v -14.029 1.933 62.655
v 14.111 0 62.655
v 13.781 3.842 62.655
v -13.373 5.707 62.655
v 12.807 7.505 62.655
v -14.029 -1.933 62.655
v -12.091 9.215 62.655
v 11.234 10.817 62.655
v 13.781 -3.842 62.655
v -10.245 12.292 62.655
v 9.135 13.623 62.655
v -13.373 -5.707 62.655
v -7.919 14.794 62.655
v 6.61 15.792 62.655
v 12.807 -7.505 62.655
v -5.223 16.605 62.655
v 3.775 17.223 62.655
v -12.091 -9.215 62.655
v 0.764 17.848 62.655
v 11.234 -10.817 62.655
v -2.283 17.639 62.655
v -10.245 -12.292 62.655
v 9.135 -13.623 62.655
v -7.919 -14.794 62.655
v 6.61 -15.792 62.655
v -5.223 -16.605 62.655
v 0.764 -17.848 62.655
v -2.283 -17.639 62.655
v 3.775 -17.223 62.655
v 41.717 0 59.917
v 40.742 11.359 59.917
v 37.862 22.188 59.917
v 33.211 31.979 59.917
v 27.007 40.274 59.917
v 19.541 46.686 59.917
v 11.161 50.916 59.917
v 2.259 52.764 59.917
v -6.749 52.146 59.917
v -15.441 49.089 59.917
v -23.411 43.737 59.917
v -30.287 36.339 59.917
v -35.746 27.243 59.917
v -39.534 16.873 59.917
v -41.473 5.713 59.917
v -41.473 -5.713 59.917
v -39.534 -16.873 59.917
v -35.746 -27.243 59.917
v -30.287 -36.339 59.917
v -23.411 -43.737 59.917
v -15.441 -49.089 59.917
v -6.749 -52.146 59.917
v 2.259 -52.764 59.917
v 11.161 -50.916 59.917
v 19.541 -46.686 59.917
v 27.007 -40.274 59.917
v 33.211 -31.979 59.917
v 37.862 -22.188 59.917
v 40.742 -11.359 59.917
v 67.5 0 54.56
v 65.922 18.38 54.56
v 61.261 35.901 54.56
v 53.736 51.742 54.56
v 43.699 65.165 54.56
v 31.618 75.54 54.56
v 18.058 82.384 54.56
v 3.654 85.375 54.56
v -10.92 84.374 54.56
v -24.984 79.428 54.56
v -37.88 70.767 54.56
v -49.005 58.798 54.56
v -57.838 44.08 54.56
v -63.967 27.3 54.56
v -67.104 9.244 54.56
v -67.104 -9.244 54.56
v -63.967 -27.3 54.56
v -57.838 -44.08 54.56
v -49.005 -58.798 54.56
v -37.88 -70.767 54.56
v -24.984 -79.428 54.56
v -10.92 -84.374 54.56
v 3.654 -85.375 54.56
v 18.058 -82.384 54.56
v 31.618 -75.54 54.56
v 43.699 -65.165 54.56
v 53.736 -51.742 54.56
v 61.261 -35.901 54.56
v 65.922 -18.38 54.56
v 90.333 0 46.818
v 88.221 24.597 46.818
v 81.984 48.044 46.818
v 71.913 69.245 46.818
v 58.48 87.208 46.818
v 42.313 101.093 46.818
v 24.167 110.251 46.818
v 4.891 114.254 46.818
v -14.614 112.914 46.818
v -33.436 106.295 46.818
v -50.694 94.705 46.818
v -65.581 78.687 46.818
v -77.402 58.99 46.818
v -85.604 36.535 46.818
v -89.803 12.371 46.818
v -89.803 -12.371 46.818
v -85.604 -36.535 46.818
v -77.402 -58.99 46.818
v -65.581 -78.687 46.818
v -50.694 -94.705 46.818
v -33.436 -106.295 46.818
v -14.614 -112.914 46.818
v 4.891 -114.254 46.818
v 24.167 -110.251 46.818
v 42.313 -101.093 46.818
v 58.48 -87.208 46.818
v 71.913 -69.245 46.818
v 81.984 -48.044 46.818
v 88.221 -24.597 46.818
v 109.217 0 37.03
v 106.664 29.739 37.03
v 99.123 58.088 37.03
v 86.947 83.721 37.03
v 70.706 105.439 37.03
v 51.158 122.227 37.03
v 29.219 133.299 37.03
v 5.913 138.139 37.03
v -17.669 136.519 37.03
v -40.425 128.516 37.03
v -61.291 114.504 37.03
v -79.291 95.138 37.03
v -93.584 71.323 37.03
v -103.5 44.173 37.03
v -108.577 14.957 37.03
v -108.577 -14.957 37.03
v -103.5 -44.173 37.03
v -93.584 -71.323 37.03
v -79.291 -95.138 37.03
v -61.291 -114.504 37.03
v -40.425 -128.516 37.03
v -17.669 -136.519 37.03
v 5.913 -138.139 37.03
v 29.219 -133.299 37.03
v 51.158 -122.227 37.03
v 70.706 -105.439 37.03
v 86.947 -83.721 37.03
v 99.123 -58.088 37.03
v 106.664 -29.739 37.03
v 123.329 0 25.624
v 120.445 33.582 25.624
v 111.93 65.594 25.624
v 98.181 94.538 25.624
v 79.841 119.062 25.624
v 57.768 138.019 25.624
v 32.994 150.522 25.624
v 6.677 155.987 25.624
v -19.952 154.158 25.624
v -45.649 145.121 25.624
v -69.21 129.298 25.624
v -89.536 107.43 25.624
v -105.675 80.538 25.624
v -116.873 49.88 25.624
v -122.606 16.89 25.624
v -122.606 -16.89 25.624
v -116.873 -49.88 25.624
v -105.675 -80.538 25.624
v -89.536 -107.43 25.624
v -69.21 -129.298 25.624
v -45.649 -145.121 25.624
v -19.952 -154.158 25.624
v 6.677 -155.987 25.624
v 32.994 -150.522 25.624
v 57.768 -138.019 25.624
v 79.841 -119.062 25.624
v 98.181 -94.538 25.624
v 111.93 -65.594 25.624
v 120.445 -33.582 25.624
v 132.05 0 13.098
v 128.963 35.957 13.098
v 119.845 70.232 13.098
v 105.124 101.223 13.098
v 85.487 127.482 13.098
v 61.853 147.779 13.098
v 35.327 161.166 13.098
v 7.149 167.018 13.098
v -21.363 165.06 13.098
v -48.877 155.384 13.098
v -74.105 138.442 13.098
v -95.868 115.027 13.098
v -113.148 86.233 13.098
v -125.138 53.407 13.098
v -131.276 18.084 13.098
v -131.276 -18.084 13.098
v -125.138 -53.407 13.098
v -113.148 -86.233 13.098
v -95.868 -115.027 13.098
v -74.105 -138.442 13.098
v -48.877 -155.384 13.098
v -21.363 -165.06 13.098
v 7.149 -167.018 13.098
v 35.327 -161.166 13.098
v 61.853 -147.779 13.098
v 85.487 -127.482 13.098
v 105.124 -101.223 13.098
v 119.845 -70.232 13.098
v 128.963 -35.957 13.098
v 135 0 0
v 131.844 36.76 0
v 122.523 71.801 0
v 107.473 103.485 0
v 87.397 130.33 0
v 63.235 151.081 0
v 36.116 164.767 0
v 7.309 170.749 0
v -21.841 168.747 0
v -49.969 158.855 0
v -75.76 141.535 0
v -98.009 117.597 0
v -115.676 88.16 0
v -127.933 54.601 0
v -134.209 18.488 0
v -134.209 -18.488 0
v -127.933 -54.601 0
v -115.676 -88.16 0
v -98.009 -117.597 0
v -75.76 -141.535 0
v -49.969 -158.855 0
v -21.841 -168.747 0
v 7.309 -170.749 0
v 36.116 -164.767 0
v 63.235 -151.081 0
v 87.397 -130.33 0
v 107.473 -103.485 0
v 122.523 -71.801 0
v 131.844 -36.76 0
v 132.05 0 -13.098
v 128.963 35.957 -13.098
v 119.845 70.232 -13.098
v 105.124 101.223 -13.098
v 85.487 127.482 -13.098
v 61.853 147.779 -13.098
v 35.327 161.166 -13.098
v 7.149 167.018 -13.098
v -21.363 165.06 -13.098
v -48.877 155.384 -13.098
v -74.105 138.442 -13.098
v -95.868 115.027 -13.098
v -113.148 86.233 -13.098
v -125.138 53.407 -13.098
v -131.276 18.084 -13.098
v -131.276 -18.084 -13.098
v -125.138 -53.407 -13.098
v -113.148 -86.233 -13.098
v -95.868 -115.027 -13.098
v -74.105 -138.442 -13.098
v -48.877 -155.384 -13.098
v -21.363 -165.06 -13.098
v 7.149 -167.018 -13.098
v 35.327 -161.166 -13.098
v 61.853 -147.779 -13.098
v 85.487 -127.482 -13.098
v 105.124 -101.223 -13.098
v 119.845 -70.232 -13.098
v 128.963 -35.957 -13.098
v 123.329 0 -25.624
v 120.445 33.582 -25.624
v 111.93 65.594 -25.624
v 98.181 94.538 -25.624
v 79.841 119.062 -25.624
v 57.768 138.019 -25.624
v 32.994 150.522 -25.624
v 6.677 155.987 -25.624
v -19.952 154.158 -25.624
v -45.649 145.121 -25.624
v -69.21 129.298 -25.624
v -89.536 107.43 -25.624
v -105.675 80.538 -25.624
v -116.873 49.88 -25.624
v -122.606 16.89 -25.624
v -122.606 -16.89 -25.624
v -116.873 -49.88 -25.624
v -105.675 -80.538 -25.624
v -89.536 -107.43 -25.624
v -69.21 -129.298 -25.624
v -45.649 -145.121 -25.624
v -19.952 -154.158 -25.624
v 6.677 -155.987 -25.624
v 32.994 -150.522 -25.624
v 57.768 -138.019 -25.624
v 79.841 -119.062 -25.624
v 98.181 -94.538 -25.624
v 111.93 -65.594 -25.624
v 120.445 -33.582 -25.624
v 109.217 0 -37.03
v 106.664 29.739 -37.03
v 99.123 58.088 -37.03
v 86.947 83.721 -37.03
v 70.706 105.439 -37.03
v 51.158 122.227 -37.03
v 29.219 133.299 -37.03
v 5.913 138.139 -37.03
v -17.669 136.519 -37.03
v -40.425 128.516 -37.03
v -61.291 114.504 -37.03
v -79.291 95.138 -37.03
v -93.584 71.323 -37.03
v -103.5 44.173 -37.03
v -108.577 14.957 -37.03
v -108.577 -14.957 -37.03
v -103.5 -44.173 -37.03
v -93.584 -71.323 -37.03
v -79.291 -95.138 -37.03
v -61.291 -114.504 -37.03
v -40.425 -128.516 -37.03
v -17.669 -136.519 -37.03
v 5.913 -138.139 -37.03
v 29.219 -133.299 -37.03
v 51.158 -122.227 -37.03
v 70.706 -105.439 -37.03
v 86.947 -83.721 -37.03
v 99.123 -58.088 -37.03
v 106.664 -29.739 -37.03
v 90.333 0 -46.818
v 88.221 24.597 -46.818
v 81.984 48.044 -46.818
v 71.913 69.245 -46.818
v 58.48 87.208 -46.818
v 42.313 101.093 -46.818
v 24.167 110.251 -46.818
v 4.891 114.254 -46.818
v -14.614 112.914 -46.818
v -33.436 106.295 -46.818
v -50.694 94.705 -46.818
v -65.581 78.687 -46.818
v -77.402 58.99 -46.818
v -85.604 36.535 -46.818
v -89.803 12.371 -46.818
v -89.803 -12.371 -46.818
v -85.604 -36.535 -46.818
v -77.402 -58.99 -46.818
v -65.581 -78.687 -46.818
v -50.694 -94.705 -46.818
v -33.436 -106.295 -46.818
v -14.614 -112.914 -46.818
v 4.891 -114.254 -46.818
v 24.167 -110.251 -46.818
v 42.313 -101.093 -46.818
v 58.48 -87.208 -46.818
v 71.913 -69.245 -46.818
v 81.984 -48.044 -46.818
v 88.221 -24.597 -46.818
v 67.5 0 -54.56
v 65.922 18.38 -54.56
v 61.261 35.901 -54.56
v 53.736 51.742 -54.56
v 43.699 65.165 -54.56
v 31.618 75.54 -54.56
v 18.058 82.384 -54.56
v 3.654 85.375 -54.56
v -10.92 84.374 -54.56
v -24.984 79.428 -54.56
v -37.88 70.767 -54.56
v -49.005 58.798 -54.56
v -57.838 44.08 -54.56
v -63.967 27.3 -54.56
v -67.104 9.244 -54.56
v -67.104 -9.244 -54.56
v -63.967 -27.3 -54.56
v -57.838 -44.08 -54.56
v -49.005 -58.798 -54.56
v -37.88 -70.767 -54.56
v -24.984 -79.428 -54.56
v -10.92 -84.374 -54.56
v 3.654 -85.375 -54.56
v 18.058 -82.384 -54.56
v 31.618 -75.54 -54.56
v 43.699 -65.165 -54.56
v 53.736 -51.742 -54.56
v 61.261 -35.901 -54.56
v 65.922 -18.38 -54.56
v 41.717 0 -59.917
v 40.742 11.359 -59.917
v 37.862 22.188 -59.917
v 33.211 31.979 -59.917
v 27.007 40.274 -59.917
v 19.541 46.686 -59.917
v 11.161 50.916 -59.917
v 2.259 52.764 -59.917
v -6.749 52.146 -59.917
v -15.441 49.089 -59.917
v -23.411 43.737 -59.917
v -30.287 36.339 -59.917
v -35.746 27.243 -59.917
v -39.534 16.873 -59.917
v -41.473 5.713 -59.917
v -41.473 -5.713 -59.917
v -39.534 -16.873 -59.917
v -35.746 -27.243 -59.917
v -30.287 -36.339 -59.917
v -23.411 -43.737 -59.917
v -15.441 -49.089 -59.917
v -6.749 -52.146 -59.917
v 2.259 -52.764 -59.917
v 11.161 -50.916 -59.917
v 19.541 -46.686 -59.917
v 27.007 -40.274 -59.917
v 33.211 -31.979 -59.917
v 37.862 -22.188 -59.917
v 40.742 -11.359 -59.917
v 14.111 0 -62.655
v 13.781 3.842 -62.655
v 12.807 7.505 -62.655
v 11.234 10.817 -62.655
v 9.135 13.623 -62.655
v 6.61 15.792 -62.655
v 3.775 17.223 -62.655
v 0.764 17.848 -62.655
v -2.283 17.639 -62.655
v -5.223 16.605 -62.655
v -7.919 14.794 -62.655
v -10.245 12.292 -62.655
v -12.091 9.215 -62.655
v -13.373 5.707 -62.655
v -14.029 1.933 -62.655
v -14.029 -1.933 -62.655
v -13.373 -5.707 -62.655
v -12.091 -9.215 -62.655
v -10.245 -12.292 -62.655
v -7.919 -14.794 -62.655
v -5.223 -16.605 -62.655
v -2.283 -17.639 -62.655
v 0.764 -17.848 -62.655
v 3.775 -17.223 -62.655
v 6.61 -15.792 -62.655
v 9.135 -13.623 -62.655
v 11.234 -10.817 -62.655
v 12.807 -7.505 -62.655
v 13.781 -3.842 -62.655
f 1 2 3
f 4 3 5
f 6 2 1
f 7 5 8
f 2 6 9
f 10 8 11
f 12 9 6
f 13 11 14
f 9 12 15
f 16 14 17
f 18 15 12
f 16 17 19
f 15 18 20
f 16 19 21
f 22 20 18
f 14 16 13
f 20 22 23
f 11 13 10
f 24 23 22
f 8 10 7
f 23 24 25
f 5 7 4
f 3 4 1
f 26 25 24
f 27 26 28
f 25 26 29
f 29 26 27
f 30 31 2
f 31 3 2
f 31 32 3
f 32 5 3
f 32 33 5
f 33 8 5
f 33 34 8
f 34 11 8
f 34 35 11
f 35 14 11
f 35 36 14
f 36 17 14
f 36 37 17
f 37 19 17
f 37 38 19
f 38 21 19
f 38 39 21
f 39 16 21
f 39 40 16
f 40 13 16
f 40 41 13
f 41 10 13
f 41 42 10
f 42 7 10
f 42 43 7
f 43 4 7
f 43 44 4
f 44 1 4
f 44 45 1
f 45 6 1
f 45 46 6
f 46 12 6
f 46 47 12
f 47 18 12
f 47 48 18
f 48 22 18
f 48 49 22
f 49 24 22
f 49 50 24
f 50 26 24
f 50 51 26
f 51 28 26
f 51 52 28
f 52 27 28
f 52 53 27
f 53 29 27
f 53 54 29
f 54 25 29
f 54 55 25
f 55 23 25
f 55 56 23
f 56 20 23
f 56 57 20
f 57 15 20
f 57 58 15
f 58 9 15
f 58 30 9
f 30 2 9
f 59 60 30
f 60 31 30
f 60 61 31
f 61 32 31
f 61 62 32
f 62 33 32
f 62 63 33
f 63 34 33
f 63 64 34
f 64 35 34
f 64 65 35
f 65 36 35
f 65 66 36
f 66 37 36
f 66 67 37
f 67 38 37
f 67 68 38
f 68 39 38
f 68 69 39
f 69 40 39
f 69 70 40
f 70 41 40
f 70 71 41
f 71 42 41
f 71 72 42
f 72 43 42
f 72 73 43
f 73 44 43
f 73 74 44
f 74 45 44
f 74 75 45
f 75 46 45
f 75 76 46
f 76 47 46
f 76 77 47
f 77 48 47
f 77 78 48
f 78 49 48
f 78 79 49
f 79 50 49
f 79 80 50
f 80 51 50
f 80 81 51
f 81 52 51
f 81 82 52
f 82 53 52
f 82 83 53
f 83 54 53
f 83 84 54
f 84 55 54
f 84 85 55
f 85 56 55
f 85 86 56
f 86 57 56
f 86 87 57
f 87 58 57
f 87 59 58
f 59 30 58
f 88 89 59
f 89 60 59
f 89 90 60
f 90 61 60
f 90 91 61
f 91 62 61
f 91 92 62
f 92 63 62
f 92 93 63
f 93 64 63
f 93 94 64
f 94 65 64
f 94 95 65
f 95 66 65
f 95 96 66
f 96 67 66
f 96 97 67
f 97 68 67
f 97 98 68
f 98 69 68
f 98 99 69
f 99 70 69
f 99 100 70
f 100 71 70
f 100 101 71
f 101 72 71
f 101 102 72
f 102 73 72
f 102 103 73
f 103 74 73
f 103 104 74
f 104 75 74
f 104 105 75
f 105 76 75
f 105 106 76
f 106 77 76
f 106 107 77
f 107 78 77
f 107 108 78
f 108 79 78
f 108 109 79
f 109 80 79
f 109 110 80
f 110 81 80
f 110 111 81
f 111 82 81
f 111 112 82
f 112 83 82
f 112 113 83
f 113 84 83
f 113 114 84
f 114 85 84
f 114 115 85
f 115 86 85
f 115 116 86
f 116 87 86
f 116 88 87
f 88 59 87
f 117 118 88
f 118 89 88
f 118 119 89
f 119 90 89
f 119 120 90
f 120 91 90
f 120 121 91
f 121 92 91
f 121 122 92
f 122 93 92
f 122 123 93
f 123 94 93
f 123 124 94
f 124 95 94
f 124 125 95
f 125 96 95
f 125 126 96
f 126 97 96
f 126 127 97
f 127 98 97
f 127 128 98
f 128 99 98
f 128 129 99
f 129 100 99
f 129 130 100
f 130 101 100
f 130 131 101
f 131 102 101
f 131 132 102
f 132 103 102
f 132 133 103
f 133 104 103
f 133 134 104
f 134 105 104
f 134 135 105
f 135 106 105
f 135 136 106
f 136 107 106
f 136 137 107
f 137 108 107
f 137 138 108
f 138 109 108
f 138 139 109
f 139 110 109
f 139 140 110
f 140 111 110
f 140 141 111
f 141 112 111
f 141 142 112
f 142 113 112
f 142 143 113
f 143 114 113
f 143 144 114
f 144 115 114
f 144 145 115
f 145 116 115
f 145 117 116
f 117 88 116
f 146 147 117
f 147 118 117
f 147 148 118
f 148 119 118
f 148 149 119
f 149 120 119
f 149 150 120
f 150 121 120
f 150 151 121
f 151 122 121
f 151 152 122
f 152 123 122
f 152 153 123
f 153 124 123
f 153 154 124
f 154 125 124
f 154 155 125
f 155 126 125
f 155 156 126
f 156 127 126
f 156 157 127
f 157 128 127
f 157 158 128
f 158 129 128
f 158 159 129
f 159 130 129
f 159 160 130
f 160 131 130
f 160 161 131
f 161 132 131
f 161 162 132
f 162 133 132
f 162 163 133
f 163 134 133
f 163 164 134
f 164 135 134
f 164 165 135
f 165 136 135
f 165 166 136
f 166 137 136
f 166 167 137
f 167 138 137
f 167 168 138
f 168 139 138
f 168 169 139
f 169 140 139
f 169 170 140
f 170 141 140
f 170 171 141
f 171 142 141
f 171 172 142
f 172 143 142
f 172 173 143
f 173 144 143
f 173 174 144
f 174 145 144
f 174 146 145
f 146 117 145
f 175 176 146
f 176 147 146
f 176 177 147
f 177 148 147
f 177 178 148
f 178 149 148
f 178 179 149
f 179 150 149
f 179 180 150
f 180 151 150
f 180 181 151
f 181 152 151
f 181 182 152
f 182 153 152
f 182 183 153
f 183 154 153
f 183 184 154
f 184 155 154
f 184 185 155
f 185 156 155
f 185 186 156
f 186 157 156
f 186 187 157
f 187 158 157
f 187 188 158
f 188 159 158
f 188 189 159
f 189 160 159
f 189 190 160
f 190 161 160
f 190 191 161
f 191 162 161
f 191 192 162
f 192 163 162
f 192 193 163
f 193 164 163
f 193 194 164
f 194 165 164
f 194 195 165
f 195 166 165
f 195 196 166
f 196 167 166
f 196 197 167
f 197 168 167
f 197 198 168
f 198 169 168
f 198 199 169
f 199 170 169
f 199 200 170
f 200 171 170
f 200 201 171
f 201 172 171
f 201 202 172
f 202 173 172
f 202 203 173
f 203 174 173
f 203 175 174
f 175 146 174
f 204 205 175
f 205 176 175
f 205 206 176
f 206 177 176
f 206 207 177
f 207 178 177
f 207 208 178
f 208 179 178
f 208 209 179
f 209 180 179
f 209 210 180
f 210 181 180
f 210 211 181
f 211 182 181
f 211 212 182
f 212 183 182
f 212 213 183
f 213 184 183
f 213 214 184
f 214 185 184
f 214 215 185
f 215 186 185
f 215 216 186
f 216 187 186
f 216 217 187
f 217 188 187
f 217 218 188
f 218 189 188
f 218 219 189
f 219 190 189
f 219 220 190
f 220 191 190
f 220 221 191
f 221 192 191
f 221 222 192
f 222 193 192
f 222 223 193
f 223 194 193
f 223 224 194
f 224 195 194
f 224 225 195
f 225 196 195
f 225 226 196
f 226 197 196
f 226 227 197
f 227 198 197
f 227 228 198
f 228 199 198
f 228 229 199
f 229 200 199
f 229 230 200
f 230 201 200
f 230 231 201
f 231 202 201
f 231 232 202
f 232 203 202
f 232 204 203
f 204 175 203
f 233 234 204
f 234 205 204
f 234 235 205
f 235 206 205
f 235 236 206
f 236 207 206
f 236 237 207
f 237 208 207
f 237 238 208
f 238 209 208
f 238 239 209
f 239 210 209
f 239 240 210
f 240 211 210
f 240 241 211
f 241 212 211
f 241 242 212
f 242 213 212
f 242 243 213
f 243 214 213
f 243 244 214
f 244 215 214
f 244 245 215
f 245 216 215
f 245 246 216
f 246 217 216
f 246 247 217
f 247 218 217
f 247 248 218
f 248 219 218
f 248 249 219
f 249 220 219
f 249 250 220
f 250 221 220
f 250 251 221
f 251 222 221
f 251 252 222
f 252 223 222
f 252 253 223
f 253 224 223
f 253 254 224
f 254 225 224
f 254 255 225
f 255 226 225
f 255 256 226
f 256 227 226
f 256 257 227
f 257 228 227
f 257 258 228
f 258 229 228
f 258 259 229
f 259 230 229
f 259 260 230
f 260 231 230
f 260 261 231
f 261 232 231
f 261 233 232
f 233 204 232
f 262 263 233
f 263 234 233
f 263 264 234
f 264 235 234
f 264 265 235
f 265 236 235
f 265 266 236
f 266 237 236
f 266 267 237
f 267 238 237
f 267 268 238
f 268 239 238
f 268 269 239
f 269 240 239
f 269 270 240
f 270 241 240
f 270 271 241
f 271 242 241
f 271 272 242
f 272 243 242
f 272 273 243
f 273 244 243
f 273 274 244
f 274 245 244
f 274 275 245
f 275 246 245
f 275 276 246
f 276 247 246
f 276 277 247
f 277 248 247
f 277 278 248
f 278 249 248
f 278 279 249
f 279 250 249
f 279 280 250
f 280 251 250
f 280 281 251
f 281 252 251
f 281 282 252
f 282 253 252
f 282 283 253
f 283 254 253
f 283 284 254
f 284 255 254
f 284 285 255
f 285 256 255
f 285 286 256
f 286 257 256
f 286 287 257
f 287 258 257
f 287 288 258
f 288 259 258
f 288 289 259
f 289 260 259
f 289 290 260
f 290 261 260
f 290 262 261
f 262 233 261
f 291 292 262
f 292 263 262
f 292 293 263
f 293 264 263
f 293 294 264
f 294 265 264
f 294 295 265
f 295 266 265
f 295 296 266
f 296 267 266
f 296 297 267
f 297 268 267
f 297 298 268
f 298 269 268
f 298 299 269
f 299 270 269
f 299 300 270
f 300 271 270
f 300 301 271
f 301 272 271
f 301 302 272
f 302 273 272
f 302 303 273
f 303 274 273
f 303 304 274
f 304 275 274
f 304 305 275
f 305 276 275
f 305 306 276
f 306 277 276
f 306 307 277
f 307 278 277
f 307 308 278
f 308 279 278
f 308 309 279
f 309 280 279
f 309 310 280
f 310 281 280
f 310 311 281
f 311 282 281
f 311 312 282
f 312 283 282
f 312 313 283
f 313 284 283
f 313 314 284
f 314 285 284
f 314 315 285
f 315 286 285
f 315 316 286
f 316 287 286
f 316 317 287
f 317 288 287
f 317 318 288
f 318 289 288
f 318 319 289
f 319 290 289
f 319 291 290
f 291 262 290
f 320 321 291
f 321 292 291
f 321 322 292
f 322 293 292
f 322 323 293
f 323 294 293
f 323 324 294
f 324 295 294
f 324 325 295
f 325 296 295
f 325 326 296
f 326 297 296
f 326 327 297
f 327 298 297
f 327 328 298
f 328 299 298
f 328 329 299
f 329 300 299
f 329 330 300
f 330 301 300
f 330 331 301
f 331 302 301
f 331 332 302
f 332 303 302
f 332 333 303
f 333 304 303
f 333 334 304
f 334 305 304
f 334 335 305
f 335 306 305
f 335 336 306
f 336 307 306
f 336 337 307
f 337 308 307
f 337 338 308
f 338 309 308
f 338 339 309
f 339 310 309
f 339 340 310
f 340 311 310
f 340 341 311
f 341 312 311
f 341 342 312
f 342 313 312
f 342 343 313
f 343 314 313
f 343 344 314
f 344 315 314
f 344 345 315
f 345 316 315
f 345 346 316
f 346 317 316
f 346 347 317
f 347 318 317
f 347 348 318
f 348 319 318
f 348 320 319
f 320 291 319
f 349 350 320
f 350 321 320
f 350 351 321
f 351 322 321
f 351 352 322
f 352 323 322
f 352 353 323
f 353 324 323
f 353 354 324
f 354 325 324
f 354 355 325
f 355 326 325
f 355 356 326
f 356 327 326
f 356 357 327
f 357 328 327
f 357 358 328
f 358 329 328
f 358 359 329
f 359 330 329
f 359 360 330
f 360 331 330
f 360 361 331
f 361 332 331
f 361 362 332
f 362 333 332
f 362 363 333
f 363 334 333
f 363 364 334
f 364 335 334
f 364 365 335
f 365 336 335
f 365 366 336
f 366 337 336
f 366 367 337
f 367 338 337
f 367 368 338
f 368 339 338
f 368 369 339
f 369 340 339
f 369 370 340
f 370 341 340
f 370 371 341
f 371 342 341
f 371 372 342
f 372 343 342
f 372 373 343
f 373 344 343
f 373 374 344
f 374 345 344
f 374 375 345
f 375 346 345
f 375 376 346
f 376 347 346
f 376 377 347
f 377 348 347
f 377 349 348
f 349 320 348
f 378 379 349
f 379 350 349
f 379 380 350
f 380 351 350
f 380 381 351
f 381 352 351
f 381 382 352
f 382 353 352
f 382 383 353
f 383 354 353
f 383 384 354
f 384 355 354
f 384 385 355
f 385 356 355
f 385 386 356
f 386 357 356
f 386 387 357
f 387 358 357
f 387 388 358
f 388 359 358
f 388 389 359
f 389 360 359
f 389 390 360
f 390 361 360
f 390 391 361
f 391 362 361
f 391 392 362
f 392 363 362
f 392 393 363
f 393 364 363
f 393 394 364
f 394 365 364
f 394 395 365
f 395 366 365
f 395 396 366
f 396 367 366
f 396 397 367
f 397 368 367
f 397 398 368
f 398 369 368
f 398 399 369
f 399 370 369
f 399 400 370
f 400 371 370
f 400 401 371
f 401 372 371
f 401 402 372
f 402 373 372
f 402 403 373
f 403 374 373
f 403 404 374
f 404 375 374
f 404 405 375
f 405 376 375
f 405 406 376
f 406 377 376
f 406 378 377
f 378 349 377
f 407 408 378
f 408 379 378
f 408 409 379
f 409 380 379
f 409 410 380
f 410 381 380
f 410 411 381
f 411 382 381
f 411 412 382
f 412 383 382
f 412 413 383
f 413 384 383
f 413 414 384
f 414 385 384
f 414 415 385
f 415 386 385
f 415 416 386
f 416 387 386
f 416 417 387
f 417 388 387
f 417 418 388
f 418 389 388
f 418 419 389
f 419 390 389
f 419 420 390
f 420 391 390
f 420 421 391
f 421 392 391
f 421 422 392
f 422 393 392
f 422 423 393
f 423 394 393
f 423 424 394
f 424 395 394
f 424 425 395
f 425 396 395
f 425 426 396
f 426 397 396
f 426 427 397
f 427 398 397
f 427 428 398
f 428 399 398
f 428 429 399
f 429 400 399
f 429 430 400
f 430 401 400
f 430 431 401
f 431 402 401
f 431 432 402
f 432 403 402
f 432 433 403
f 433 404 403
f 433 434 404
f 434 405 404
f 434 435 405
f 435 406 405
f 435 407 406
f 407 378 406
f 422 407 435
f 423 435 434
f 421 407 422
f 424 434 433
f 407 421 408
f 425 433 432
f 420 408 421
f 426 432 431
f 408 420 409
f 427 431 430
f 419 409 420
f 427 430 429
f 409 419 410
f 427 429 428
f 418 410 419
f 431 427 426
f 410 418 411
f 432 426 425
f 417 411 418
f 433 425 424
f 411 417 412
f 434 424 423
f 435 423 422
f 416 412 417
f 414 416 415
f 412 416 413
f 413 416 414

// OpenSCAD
// Generated by SolidPython 1.0.1 on 2020-07-29 00:46:52


scale(v = [15, 19, 7]) {
	sphere(r = 9);
}
/***********************************************
*********      SolidPython code:      **********
************************************************
 
# import packages: SolidPython
from solid import *
from solid.utils import *
from itertools import chain, combinations, permutations


class Resize:

    def __init__(self, scad_file):
        self.scad_file = scad_file
        #self.scad_file = import_scad(scad_file)
        # cone/cylinder param:
        self.r1 = 0
        self.r2 = 0
        self.h = 0
        # rectangular prism param:
        self.w = 0
        self.l = 0
        # ellipse param:
        self.r = 0

    # import OpenScad code (file name corresponds to shape)


    # classify shape + parameters
    def assign(self, param1, param2, param3):
        if self.scad_file == 'cone.scad':
            self.r1 = param1
            self.r2 = param2
            self.h = param3
        elif self.scad_file == 'cylinder.scad':
            self.r1 = param1
            self.r2 = param2
            self.h = param3
        elif self.scad_file == 'rectangularPrism.scad':
            self.h = param1
            self.l = param2
            self.w = param3
        else:
            self.r = param1
            self.h = param2

    # resize parameters
    def iterate(self):
        x = range(3, 20, 2)
        i = 1
        if self.scad_file == 'cone.scad':
            tempList = list(permutations(x, 2))
            for temp in tempList:
                param1 = temp[0]
                param2 = temp[1]
                filepath = 'produced_scad_files/' + 'cone' + str(param1) + '_' + str(param2) + '_' + '.scad'
                scad_render_to_file(cylinder(h=param1, r1=param2, r2=0), filepath)

        elif self.scad_file == 'cylinder.scad':
            tempList = list(permutations(x, 3))
            for temp in tempList:
                param1 = temp[0]
                param2 = temp[1]
                filepath = 'produced_scad_files/' + 'cylinder' + str(param1) + '_' + str(param2) + '_' + '.scad'
                scad_render_to_file(cylinder(h=param1, r1=param2, r2=param2), filepath)

        elif self.scad_file == 'rectangularPrism.scad':
            tempList = list(permutations(x, 3))
            for temp in tempList:
                param1 = temp[0]
                param2 = temp[1]
                param3 = temp[2]
                filepath = 'produced_scad_files/' + 'rectangularPrism' + str(param1) + '_' + str(param2) + '_' + str(
                    param3) + '.scad'
                scad_render_to_file(cube(size=(param1, param2, param3)), filepath)

        elif self.scad_file == 'ellipse.scad':
            tempList = list(permutations(x, 4))
            for temp in tempList:
                param1 = temp[0]
                param2 = temp[1]
                param3 = temp[2]
                param4 = temp[3]
                filepath = 'produced_scad_files/' + 'ellipse' + str(param1) + '_' + str(param2) + '_' + str(param3) + '_' + str(param4) + '.scad'
                scad_render_to_file(scale([param1, param2, param3])(sphere(r=param4)), filepath)

    def render_to_scadfile(self):
        scad_render_to_file(scad, 'example.scad') 
 
************************************************/
